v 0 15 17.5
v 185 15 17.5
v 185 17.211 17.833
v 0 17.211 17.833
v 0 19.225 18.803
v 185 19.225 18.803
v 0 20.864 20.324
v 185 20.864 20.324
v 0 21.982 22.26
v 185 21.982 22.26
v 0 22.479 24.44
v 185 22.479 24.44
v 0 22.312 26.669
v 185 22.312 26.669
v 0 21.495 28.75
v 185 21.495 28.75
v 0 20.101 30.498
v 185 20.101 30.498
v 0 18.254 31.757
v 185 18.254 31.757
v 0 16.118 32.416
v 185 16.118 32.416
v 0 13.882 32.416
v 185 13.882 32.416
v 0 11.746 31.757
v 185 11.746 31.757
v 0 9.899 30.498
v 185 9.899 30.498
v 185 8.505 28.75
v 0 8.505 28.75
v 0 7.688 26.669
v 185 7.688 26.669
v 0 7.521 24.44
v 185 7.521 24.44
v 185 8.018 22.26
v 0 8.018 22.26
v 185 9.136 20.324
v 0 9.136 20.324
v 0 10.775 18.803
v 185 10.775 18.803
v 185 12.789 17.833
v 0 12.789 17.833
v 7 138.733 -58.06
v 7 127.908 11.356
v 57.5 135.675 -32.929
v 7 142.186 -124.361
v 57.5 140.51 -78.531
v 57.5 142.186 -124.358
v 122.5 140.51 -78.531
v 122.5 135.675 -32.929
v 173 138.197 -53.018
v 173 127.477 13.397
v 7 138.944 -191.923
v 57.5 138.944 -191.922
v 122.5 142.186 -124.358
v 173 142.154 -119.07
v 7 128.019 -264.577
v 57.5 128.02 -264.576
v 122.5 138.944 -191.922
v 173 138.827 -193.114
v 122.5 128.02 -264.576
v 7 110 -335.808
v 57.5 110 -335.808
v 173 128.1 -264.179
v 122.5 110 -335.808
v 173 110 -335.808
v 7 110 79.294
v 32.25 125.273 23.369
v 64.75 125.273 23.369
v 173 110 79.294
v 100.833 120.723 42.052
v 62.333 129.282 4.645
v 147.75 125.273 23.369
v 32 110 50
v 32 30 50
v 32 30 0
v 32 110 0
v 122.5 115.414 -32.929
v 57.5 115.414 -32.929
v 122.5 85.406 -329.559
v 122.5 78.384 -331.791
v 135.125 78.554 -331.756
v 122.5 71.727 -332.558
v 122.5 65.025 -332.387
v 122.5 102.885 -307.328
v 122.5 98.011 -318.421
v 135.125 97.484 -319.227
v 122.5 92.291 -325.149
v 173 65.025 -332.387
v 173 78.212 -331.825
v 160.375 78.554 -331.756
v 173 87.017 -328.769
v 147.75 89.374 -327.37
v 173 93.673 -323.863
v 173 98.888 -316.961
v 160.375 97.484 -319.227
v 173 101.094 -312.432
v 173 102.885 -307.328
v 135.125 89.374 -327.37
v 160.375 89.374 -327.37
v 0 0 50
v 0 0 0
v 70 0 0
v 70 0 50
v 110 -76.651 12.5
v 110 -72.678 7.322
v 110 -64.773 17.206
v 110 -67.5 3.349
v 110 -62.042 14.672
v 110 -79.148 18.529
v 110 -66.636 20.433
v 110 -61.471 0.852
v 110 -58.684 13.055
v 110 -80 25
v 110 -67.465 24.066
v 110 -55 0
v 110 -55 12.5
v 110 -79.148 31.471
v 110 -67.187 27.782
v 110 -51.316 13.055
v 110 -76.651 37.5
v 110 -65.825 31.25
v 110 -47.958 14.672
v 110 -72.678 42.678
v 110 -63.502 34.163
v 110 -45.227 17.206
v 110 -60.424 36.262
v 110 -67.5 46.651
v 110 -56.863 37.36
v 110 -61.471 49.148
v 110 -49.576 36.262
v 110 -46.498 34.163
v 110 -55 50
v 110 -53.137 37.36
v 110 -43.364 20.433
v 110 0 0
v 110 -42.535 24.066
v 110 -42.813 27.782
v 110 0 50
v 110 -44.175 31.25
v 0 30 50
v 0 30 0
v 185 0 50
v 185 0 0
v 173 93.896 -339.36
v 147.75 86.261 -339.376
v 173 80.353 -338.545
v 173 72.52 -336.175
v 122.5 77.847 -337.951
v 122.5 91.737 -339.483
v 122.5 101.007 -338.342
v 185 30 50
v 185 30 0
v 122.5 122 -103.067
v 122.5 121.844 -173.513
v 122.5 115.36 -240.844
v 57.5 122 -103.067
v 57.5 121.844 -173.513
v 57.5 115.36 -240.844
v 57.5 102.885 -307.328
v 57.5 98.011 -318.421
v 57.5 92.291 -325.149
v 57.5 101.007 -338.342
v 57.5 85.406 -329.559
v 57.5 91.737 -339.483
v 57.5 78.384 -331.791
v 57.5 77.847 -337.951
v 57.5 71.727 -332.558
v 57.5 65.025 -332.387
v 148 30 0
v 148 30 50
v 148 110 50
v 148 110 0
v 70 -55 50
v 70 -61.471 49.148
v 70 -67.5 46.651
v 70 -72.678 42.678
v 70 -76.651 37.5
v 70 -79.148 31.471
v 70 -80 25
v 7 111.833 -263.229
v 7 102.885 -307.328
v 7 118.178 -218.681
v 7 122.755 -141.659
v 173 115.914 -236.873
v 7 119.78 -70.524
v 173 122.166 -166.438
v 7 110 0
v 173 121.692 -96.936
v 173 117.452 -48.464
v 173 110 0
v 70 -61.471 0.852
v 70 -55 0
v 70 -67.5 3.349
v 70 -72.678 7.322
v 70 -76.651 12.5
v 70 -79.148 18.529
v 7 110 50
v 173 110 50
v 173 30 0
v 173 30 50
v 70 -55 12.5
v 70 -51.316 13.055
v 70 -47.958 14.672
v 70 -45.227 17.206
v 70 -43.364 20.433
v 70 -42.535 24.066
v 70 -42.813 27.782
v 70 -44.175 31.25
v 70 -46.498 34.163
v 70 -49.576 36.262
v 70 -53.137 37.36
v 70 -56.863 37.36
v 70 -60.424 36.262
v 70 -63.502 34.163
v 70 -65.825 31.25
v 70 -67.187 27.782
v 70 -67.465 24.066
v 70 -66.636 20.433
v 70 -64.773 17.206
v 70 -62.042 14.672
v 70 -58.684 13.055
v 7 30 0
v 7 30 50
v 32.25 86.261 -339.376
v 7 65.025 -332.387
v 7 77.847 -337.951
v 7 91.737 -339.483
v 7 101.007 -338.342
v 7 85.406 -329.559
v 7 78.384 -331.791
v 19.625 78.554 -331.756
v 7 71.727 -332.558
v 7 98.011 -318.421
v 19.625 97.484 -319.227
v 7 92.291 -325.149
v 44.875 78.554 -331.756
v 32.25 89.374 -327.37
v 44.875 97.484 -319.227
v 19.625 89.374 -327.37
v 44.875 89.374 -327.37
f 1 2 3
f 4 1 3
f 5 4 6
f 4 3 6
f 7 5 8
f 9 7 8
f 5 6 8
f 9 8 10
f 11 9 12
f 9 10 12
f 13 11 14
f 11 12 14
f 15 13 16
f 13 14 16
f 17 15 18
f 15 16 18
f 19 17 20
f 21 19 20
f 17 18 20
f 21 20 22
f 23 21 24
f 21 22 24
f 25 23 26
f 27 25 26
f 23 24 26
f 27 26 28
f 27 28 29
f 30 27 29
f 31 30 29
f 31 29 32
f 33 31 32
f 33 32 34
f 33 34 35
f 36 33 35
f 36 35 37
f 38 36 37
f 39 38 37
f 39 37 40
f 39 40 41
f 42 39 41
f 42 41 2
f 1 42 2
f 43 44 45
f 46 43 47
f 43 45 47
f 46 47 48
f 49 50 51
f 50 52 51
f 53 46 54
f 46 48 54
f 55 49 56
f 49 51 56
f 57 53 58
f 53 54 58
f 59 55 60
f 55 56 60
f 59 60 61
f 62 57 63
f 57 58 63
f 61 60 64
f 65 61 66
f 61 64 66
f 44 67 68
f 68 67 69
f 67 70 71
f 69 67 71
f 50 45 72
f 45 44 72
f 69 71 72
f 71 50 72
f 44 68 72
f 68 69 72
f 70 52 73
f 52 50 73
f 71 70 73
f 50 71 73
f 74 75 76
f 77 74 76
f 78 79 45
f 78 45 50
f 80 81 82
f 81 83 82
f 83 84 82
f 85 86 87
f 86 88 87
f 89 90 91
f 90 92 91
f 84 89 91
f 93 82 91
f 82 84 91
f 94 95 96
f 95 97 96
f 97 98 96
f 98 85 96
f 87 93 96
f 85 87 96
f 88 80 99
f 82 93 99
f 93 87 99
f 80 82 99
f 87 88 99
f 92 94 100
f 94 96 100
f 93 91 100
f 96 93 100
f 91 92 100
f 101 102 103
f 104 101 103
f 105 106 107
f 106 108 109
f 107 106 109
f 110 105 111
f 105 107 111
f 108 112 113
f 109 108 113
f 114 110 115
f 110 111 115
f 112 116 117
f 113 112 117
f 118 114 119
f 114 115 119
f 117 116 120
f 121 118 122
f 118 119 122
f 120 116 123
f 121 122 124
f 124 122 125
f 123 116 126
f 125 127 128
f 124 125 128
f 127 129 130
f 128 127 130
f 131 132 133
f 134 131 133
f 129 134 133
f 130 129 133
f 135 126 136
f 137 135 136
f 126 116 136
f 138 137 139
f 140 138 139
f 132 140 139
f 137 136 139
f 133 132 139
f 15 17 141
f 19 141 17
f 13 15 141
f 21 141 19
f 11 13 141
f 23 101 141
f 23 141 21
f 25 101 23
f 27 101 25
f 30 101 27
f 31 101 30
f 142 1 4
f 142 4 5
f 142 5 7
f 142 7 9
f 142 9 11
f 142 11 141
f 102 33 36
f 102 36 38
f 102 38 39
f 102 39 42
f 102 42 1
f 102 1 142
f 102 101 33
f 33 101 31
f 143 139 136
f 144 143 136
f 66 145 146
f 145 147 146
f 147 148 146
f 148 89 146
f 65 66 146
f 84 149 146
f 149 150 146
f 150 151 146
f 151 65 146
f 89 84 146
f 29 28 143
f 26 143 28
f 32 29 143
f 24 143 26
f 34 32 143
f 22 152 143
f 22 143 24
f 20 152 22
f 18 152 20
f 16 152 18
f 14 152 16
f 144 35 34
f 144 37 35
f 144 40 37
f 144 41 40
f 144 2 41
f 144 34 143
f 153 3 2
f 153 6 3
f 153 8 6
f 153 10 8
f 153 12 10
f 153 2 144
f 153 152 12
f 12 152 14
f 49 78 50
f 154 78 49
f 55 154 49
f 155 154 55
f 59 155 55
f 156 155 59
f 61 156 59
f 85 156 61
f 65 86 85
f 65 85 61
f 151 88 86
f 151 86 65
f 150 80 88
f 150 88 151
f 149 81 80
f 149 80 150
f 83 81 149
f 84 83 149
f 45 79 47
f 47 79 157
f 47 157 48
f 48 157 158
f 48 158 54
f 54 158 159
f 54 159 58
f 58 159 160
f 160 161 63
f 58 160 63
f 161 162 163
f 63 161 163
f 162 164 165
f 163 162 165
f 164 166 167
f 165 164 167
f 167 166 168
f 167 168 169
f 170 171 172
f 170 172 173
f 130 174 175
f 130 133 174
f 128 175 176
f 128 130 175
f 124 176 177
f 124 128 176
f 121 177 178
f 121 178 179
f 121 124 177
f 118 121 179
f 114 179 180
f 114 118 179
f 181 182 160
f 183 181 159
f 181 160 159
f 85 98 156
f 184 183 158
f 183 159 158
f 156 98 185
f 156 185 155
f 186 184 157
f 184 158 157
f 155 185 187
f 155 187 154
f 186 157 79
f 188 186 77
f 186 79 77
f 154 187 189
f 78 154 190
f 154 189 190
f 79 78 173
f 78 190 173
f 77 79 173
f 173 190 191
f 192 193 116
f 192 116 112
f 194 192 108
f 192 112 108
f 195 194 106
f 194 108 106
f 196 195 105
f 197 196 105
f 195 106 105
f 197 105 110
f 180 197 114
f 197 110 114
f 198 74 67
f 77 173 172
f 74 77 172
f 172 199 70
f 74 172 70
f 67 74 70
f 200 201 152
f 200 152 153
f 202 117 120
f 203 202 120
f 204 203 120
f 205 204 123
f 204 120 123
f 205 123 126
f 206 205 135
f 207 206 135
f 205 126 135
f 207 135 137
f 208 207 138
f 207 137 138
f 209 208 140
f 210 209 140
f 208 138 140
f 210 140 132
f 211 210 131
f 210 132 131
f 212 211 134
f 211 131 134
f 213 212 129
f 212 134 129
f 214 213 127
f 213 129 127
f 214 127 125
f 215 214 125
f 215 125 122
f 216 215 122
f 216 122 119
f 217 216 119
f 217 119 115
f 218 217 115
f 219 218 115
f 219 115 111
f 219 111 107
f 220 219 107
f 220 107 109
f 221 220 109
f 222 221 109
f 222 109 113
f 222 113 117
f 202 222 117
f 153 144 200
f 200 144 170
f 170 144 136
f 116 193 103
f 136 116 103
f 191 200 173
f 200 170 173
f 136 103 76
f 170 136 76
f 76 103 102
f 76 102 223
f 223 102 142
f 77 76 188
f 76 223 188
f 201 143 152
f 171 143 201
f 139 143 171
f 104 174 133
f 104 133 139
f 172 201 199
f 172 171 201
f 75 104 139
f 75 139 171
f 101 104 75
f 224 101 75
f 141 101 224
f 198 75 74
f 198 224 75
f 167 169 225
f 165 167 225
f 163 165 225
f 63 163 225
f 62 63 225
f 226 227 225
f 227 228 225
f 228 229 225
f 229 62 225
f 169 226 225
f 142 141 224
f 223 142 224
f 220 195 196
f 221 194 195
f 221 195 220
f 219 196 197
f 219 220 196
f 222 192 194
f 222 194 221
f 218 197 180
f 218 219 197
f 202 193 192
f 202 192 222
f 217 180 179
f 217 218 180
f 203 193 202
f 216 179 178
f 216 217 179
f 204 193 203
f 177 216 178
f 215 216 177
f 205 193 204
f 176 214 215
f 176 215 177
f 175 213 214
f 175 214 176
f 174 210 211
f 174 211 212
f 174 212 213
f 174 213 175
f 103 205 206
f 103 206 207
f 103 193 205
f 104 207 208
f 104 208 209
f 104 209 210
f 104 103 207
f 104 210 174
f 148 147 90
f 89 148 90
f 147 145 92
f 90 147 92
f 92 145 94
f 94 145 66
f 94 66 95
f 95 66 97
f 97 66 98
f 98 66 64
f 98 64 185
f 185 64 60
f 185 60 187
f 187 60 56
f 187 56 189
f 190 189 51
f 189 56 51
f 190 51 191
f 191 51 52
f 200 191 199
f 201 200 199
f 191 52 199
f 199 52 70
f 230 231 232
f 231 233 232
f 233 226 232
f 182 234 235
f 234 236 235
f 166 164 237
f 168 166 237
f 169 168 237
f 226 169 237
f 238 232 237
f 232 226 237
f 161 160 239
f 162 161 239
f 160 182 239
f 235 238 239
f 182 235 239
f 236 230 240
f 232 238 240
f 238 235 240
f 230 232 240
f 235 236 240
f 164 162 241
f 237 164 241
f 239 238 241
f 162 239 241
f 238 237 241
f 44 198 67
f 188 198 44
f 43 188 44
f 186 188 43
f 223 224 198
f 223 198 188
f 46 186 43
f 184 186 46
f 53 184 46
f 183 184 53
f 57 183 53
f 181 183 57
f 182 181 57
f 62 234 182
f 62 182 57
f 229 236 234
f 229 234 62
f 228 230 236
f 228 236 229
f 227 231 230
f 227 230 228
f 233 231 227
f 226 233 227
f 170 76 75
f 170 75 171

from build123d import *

# Parameters (mm, degrees)
SKETCH_1_W          = 180
SKETCH_1_H          = 50
EXTRUDE_1_DEPTH     = 30
SKETCH_2_W          = 40
SKETCH_2_H          = 50
EXTRUDE_2_DEPTH     = 80
FILLET_1_R          = 25
SKETCH_3_R          = 12.5
CUT_EXTRUDE_2_DEPTH = 145.913767462
SKETCH_7_W          = 25
SKETCH_7_H          = 50
EXTRUDE_5_DEPTH     = 80
EXTRUDE_6_REACH     = 213.019
SKETCH_9_W          = 65
SKETCH_9_H          = 330.441162185
CUT_EXTRUDE_4_DEPTH = 401.320460854
SKETCH_10_W         = 50
SKETCH_10_H         = 30
EXTRUDE_7_DEPTH     = 10
SKETCH_11_W         = 50
SKETCH_11_H         = 30
CUT_EXTRUDE_5_DEPTH = 5
SKETCH_12_R         = 7.5
CUT_EXTRUDE_6_DEPTH = 412.962042251


with BuildPart() as part:
    # 草图1 → 凸台-拉伸1 (new body)
    with BuildSketch(Plane(origin=(0, 0, 0), x_dir=(1, 0, 0), z_dir=(0, 1, 0))):
        with Locations((90, -25)):
            Rectangle(SKETCH_1_W, SKETCH_1_H)
    extrude(amount=EXTRUDE_1_DEPTH)

    # 草图2 → 凸台-拉伸2 (add)
    with BuildSketch(Plane.XZ):
        with Locations((90, 25)):
            Rectangle(SKETCH_2_W, SKETCH_2_H)
    extrude(amount=EXTRUDE_2_DEPTH)

    # 圆角1
    fillet_1_edges = [part.edges().sort_by_distance(p)[0] for p in [
        (90, -80, 50),
        (90, -80, 0),
    ]]
    fillet(fillet_1_edges, radius=FILLET_1_R - 0.0001)  # a hair under: the kernel refuses the full size

    # 草图3 → 切除-拉伸2 (cut, through all)
    with BuildSketch(Plane(origin=(110, 0, 0), x_dir=(0, 0, -1), z_dir=(1, 0, 0))):
        with Locations((-25, -55)):
            Circle(SKETCH_3_R)
    extrude(amount=-CUT_EXTRUDE_2_DEPTH, mode=Mode.SUBTRACT)

    # 草图7 → 凸台-拉伸5 (add)
    with BuildSketch(Plane(origin=(0, 30, 0), x_dir=(1, 0, 0), z_dir=(0, 1, 0))):
        with Locations((19.5, -25)):
            Rectangle(SKETCH_7_W, SKETCH_7_H)
        with Locations((160.5, -25)):
            Rectangle(SKETCH_7_W, SKETCH_7_H)
    extrude(amount=EXTRUDE_5_DEPTH)

    # 凸台-拉伸6: up to this face of the body (flat: up to its plane)
    extrude_6_end = Plane(part.part.faces().sort_by_distance((7, 70, 25))[0])
    # 草图8 → 凸台-拉伸6 (add, up to the picked face)
    with BuildSketch(Plane(origin=(173, 0, 0), x_dir=(0, 0, -1), z_dir=(1, 0, 0)), mode=Mode.PRIVATE) as extrude_6_sk1:
        with BuildLine():
            Line((0, 110), (-79.29372145, 110))
            add(Edge.make_bspline(
                [(-79.29372145, 110), (123.322725029, 174.375095478), (335.808448859, 110)],
                knots=[0, 0, 0, 1, 1, 1], degree=2))
            add(Edge.make_bspline(
                [(335.808448859, 110), (344.655163531, 85.008885119), (332.386652106, 65.024574676)],
                knots=[0, 0, 0, 1, 1, 1], degree=2))
            add(Edge.make_bspline(
                [(332.386652106, 65.024574676), (334.882025134, 94.793074398), (307.328252939, 102.88474179)],
                knots=[0, 0, 0, 1, 1, 1], degree=2))
            add(Edge.make_bspline(
                [(307.328252939, 102.88474179), (153.571097441, 138.708355764), (0, 110)],
                knots=[0, 0, 0, 1, 1, 1], degree=2))
        make_face()
    extrude_6_tool1 = split(extrude(extrude_6_sk1.sketch, amount=-EXTRUDE_6_REACH, mode=Mode.PRIVATE), bisect_by=extrude_6_end, keep=Keep.BOTH, mode=Mode.PRIVATE)
    add(extrude_6_tool1.solids().sort_by(Axis((173, 122.914419, -143.709252), (-1, 0, 0)))[0])

    # 草图9 → 切除-拉伸4 (cut, through all)
    with BuildSketch(Plane(origin=(0, 30, 0), x_dir=(1, 0, 0), z_dir=(0, 1, 0))):
        with Locations((90, 198.149530653)):
            Rectangle(SKETCH_9_W, SKETCH_9_H)
    extrude(amount=CUT_EXTRUDE_4_DEPTH, mode=Mode.SUBTRACT)

    # 草图10 → 凸台-拉伸7 (add)
    with BuildSketch(Plane(origin=(180, 0, 0), x_dir=(0, 0, -1), z_dir=(1, 0, 0))):
        with Locations((-25, 15)):
            Rectangle(SKETCH_10_W, SKETCH_10_H)
    extrude(amount=EXTRUDE_7_DEPTH)

    # 草图11 → 切除-拉伸5 (cut)
    with BuildSketch(Plane(origin=(190, 0, 0), x_dir=(0, 0, -1), z_dir=(1, 0, 0))):
        with Locations((-25, 15)):
            Rectangle(SKETCH_11_W, SKETCH_11_H)
    extrude(amount=-CUT_EXTRUDE_5_DEPTH, mode=Mode.SUBTRACT)

    # 草图12 → 切除-拉伸6 (cut, through all)
    with BuildSketch(Plane(origin=(185, 0, 0), x_dir=(0, 0, -1), z_dir=(1, 0, 0))):
        with Locations((-25, 15)):
            Circle(SKETCH_12_R)
    extrude(amount=-CUT_EXTRUDE_6_DEPTH, mode=Mode.SUBTRACT)


solid = part.part
